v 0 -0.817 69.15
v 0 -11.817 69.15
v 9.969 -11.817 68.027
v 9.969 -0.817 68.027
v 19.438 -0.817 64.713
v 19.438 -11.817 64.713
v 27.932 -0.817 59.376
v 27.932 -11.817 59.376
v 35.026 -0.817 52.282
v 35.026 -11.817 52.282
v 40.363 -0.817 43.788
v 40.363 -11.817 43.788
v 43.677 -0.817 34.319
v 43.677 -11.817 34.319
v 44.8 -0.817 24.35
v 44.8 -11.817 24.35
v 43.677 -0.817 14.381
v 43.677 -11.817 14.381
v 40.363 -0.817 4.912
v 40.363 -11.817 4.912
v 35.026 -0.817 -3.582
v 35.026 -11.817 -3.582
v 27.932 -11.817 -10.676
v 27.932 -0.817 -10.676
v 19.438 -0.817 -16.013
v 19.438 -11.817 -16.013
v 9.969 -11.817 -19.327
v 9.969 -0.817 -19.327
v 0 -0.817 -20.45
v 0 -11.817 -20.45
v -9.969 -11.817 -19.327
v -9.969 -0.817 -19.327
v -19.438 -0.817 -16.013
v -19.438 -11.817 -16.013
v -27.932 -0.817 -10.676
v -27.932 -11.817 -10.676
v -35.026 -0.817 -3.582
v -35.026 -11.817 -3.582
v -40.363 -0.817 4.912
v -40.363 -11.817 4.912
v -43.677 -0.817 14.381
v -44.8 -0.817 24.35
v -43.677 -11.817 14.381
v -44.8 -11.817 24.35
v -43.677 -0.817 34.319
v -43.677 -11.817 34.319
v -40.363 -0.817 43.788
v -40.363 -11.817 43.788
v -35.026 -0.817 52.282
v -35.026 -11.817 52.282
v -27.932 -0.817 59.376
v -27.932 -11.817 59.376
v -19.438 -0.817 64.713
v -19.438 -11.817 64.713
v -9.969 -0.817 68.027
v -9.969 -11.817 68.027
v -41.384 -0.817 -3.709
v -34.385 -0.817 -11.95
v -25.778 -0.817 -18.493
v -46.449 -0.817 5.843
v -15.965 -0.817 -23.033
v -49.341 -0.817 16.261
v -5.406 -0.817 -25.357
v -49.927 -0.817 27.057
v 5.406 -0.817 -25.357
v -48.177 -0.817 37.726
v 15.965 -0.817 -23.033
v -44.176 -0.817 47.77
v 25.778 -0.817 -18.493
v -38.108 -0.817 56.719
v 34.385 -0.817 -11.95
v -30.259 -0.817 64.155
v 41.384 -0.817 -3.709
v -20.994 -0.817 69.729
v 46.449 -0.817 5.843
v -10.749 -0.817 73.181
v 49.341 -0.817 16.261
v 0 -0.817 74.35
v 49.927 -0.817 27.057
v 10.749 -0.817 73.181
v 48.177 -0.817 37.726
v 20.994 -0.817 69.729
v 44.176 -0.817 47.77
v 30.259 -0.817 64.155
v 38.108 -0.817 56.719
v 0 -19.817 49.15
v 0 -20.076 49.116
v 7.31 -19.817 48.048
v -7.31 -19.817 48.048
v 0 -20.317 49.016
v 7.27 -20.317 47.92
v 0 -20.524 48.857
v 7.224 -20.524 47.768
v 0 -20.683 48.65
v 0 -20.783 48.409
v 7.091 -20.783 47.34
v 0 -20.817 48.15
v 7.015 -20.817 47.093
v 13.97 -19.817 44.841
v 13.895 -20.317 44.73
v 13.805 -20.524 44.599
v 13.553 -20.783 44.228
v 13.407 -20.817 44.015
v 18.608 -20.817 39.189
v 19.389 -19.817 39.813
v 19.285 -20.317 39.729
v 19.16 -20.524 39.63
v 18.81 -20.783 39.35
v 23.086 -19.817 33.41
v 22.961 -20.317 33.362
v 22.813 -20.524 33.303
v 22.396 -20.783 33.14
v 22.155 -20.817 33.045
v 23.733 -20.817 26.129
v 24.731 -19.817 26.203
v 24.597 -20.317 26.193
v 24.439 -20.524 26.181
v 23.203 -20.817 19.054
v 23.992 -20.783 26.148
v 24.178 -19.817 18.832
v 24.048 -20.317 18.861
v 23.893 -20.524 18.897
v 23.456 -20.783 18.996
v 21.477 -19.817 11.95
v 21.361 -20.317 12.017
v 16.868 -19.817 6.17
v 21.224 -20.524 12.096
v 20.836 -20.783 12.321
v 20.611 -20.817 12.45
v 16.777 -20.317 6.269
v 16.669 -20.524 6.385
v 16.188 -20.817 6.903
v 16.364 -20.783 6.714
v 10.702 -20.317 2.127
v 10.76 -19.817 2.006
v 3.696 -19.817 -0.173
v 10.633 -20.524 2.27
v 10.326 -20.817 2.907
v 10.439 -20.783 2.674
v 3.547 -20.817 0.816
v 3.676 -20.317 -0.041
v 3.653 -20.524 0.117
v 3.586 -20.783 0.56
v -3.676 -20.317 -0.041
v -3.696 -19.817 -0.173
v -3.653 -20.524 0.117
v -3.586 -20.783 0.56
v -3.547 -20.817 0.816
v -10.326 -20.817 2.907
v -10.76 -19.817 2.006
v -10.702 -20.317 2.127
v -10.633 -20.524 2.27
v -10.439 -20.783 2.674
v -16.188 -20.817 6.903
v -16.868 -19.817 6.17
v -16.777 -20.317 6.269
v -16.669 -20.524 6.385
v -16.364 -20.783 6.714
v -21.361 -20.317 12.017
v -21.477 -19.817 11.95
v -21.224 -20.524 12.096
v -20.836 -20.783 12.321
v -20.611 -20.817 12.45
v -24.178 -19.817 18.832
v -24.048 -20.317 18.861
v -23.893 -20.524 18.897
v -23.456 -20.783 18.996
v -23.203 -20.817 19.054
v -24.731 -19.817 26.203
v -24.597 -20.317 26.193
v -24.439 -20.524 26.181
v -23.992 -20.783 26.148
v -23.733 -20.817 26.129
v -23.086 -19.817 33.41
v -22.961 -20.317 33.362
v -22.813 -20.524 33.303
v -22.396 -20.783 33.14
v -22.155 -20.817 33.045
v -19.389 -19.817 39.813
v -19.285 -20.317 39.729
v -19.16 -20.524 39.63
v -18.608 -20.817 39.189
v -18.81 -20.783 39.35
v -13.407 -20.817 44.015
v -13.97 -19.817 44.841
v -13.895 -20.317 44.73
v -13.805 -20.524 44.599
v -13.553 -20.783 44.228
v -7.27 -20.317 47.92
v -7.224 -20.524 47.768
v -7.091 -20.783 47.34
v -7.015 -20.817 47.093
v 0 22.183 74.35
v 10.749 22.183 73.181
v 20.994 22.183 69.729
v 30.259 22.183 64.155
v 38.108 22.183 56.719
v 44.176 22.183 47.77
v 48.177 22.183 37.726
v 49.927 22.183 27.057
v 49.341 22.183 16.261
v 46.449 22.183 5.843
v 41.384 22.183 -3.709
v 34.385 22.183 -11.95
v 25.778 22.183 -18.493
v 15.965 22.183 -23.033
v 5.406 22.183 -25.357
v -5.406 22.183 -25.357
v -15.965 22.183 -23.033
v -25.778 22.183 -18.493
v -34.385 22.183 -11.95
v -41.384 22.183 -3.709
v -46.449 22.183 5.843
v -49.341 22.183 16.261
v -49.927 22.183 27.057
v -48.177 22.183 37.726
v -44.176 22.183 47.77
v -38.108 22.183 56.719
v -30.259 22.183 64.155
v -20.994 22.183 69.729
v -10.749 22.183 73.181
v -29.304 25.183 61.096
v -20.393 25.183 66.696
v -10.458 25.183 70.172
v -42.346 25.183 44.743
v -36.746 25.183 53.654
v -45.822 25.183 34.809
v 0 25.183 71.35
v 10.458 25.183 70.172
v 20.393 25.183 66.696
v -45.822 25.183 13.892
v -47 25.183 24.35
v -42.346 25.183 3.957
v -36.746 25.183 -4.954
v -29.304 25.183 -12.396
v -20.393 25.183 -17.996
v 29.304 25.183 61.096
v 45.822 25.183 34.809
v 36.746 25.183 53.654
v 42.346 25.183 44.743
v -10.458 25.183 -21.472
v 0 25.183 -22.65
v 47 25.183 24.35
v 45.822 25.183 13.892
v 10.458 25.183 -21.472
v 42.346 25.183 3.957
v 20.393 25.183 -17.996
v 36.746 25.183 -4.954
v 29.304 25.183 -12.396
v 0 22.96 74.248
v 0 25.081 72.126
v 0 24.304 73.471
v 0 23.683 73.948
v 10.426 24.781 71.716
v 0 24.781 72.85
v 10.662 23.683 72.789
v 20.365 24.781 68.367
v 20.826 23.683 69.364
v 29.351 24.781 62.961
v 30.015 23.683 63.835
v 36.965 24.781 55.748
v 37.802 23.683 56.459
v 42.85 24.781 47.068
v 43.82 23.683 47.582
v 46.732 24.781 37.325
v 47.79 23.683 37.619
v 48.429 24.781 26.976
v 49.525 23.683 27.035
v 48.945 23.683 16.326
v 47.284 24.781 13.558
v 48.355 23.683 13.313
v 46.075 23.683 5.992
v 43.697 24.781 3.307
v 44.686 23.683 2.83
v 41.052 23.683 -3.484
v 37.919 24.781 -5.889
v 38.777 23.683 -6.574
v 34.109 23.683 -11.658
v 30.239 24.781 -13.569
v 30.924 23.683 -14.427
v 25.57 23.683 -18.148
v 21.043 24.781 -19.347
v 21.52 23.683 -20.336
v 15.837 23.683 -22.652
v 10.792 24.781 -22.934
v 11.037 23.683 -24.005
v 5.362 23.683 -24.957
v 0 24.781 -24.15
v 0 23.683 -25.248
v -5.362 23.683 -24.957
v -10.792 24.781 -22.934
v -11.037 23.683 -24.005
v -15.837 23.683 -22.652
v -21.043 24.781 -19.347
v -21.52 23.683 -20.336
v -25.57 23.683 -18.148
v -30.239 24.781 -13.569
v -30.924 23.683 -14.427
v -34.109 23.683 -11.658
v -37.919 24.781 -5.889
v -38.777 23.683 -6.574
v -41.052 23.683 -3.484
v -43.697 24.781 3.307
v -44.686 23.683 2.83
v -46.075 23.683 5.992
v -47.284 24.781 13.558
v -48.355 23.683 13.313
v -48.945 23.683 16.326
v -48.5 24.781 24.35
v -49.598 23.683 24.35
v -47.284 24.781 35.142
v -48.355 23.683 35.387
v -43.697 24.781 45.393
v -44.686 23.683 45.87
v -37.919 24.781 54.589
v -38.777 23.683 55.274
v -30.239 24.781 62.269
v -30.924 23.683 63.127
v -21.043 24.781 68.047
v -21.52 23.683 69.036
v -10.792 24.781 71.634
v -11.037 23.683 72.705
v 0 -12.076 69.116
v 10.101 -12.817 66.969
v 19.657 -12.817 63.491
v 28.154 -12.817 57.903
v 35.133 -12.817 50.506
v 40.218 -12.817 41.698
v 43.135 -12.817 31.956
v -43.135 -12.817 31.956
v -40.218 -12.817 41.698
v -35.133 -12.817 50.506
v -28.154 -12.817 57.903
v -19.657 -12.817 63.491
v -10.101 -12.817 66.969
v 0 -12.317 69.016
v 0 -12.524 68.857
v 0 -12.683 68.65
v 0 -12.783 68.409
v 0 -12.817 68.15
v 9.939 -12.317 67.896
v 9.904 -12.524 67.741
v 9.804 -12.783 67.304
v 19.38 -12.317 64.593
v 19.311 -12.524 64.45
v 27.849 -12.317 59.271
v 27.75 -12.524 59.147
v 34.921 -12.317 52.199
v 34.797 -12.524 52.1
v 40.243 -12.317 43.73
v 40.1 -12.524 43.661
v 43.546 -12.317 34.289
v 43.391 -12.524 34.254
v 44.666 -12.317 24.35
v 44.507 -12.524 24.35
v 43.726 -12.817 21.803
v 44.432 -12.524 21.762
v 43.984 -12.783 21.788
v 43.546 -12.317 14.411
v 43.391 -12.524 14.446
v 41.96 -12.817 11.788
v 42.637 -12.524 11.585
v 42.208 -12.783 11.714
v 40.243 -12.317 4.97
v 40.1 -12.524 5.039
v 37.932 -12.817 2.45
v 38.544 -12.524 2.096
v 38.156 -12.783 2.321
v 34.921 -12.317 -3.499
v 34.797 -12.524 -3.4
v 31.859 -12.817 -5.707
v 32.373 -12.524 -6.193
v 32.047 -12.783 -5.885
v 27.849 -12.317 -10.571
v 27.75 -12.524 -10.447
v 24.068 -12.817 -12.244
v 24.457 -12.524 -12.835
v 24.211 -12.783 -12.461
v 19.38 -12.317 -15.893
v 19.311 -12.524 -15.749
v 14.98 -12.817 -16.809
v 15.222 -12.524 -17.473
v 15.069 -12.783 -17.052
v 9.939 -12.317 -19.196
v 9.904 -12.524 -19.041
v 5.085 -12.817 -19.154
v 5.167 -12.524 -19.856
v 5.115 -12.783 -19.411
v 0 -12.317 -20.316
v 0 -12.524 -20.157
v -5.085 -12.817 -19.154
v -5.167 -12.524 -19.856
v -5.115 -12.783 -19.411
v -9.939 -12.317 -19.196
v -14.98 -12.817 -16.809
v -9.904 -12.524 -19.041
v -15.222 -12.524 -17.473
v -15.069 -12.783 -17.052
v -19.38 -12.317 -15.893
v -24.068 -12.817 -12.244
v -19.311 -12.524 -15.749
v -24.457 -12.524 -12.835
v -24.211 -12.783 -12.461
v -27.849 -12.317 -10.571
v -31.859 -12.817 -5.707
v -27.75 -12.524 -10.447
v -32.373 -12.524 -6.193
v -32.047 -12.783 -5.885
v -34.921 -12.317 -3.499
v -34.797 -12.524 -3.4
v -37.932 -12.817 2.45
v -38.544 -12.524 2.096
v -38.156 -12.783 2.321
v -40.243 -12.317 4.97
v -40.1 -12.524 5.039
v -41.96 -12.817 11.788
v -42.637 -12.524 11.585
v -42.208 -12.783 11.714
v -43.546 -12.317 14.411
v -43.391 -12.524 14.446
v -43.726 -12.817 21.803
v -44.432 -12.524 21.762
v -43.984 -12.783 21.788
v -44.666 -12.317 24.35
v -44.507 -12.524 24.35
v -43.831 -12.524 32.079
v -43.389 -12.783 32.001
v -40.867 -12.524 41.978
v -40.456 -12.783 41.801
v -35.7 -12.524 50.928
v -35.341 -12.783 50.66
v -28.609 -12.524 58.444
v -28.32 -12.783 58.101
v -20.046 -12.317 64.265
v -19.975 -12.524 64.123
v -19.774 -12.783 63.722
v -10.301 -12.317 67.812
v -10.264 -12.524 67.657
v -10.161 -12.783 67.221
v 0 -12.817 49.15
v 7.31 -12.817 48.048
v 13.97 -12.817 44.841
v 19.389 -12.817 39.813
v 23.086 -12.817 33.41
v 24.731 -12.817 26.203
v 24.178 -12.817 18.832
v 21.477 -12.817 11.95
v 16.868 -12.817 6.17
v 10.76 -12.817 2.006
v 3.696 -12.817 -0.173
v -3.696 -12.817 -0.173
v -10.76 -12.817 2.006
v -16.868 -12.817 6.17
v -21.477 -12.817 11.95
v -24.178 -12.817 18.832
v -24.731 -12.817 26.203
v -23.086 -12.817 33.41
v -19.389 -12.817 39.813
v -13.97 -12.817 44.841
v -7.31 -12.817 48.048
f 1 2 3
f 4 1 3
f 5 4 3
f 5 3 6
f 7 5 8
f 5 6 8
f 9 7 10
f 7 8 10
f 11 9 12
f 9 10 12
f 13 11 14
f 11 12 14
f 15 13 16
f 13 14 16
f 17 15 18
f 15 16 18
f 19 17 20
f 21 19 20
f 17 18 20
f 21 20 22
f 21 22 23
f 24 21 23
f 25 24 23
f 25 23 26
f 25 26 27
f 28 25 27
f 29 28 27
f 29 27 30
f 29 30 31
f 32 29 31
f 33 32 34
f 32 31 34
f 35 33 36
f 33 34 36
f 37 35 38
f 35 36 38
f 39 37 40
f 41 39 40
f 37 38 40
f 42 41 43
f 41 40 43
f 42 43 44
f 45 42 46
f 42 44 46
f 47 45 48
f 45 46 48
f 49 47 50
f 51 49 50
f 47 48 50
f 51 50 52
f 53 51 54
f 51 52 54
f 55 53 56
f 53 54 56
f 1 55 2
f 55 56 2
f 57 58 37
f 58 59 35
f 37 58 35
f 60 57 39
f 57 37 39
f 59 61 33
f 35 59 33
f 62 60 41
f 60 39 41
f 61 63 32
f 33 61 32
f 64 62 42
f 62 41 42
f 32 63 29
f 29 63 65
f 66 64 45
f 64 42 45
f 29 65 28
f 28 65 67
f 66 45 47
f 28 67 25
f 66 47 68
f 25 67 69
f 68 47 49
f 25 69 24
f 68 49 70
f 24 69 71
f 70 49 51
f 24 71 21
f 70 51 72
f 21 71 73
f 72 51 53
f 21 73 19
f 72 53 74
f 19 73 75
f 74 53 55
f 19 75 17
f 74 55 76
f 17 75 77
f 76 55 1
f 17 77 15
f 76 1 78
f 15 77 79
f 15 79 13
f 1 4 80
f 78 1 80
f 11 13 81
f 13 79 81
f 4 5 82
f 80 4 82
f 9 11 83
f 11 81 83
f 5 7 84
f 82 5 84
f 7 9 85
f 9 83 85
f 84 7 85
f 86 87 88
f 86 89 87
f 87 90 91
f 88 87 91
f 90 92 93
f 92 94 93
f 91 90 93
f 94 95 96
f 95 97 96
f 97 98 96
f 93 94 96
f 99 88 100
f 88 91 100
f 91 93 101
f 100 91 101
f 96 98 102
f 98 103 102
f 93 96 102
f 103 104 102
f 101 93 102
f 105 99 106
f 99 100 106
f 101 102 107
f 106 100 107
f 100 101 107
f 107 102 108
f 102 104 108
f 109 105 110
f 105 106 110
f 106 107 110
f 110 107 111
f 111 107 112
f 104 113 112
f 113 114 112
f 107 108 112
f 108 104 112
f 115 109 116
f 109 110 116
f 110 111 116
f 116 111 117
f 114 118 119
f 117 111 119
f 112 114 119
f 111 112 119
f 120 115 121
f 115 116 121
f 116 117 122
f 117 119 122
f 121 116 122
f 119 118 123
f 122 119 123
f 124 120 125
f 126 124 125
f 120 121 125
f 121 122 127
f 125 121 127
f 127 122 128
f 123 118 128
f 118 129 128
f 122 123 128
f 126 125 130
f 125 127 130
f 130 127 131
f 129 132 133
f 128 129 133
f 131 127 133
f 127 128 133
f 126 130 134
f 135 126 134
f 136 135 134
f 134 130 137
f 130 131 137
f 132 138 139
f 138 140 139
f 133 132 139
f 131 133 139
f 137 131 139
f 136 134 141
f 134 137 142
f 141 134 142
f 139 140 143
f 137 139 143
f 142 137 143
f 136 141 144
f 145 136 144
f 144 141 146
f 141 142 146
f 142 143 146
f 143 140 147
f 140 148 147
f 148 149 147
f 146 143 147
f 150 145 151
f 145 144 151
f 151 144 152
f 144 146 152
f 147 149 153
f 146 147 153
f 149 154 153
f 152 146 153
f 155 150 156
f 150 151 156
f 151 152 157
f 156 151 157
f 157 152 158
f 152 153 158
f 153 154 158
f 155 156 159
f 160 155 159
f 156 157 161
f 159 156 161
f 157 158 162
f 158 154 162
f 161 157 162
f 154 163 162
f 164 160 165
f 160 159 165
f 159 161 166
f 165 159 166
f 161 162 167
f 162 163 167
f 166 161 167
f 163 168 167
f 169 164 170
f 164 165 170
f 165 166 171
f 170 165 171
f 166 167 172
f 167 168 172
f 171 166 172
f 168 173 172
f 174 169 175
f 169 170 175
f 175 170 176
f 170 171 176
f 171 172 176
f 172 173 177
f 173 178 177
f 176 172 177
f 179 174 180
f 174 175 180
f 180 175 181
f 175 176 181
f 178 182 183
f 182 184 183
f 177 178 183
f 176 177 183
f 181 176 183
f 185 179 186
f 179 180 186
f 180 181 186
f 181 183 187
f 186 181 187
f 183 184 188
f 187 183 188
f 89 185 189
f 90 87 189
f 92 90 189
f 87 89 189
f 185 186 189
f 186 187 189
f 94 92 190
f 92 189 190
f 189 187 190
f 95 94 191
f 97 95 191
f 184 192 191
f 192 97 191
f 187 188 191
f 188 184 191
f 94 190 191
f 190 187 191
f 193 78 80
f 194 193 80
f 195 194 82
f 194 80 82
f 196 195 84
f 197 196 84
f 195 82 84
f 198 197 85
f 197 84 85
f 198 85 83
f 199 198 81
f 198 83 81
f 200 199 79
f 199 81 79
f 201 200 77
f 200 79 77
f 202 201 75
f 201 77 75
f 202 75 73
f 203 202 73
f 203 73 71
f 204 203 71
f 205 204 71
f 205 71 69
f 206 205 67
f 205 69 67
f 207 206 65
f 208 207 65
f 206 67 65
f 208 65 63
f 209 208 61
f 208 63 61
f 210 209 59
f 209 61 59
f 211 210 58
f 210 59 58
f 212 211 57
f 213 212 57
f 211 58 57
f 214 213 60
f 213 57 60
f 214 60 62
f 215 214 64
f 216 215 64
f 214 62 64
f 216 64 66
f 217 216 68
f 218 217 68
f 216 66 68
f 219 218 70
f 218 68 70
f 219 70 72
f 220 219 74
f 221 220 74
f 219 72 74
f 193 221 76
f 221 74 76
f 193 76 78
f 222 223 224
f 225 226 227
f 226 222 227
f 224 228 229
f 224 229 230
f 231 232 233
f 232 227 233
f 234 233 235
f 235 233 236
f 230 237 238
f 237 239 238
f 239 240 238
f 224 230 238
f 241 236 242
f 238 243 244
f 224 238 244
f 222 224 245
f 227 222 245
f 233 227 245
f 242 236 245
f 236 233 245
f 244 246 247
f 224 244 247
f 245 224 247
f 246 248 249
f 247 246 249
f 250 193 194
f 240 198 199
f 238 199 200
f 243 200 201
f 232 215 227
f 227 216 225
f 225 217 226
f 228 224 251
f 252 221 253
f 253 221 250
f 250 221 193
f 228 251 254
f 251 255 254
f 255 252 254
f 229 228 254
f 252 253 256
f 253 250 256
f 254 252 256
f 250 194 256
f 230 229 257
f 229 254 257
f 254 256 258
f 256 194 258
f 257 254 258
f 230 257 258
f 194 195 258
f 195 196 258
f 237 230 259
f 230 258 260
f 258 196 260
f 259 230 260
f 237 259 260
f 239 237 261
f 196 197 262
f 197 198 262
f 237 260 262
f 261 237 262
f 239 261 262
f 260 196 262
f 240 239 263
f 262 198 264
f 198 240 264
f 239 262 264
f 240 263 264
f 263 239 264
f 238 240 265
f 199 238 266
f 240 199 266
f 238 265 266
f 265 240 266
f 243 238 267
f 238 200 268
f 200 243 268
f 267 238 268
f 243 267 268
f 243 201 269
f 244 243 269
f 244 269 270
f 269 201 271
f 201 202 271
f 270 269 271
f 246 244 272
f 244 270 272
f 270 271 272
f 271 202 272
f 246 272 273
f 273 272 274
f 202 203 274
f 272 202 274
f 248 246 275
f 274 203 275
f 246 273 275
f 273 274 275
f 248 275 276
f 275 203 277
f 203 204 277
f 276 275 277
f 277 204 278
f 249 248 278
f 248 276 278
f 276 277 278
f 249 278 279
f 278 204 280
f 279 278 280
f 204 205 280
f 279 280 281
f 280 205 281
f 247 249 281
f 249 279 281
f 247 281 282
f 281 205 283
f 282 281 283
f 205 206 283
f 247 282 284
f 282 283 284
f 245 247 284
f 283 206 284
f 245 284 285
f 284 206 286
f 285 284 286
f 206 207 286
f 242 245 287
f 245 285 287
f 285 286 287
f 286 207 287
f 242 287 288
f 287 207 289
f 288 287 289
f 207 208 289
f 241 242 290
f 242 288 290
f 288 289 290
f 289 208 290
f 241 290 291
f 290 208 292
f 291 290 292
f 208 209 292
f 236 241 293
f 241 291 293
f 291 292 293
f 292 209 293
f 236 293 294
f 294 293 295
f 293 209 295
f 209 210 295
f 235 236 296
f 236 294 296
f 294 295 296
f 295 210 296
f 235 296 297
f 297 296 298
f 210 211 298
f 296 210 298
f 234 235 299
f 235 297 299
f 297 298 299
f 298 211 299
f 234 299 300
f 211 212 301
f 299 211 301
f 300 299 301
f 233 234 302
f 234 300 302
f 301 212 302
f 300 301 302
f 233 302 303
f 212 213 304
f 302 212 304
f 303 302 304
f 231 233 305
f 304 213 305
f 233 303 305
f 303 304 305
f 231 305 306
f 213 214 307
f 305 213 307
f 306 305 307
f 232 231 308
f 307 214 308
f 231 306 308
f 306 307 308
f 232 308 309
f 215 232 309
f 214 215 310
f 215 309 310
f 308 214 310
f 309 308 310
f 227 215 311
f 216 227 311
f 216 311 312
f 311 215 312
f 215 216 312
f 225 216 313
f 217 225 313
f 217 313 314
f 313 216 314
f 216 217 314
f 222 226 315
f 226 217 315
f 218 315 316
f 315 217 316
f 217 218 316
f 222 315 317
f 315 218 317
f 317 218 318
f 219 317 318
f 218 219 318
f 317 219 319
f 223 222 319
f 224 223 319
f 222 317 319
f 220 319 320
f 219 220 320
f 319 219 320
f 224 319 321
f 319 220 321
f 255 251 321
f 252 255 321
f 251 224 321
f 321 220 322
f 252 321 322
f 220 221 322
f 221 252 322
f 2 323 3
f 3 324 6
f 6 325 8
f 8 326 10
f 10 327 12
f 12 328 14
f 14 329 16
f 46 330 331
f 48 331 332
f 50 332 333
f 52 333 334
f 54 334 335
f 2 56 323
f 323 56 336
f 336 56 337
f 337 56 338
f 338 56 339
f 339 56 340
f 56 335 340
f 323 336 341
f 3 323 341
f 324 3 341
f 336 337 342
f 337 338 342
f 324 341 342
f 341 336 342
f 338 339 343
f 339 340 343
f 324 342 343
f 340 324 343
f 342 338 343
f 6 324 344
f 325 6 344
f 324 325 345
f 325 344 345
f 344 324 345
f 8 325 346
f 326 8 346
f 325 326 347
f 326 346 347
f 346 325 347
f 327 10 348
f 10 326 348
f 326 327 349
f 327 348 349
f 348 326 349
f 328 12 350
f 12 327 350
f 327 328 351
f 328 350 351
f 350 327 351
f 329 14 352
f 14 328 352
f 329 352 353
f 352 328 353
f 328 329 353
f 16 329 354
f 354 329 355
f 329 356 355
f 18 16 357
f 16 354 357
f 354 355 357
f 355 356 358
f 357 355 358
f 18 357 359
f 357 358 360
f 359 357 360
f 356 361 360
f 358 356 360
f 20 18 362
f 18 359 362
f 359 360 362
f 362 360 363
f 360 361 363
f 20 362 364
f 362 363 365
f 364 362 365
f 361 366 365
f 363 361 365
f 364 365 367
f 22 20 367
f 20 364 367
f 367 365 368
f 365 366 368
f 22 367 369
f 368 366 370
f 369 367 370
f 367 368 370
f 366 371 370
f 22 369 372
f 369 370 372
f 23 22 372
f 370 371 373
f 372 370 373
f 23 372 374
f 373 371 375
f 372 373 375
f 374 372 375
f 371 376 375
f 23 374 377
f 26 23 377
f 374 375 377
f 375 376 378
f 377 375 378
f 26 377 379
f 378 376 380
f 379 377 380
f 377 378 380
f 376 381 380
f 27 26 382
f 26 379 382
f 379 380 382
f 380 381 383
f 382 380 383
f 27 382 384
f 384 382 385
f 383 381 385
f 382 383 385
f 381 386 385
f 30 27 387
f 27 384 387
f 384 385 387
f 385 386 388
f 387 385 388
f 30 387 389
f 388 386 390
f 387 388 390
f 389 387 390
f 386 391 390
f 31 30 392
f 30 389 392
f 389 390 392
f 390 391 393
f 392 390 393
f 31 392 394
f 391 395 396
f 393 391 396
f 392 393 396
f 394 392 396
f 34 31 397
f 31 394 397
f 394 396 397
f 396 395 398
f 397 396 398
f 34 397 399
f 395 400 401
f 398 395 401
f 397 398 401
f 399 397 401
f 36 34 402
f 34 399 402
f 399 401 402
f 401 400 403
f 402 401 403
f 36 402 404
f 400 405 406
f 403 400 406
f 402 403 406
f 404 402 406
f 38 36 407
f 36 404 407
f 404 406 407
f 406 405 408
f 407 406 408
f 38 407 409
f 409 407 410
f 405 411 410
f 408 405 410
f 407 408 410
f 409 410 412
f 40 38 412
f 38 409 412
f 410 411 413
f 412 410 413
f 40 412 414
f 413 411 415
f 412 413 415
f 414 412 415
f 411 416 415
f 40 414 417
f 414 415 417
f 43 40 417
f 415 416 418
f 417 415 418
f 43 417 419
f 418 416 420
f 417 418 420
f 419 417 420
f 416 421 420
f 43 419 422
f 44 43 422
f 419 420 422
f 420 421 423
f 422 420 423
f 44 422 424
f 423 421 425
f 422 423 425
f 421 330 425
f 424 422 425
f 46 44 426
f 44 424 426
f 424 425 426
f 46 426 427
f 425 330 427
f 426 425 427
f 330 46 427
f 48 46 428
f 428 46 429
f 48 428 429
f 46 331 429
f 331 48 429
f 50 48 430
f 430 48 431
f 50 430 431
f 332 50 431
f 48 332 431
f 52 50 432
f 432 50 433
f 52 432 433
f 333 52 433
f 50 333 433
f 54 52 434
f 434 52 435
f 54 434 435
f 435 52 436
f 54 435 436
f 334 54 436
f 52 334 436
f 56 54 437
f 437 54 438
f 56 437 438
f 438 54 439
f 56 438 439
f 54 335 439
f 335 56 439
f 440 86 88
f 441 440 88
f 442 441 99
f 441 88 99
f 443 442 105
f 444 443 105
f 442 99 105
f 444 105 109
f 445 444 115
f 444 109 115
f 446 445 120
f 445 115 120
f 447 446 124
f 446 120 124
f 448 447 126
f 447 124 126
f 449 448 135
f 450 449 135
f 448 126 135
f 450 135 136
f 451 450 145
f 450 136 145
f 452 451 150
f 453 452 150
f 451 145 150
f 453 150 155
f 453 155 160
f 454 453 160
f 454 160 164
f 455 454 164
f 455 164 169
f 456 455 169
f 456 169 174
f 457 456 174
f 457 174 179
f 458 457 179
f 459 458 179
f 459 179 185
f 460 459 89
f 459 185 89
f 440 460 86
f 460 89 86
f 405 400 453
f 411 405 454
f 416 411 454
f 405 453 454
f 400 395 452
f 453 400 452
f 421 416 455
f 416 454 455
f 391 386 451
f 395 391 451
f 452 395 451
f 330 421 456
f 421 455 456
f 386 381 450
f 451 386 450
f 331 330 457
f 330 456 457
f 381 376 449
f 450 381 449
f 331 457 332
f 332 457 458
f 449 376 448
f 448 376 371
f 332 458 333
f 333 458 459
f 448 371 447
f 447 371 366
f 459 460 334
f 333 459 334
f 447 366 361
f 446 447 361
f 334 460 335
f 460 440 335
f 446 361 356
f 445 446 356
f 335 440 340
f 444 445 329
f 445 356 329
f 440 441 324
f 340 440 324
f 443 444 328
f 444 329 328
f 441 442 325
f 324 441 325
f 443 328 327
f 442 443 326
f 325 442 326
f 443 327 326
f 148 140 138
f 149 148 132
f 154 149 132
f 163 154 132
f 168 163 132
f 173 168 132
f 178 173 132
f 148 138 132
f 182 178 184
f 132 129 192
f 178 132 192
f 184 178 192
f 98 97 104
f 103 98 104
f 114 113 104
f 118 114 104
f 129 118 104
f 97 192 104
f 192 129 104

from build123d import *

# Parameters (mm, degrees)
F2_R = 3
F3_R = 1
F4_R = 1


with BuildPart() as f1:
    # F0 (on Right) → F1 (revolve)
    with BuildSketch(Plane.YZ):
        Polygon((-20.8168569952, 49.1500228971), (-20.8168569952, 24.3500228971), (25.1831430048, 24.3500228971), (25.1831430048, 74.3500228971), (-0.8168569952, 74.3500228971), (-0.8168569952, 69.1500228971), (-12.8168569952, 69.1500228971), (-12.8168569952, 49.1500228971), align=None)
    revolve(axis=Axis((0, 2.1831430048, 24.3500228971), (0, 1, 0)))

    # F2
    f2_edges = [f1.edges().sort_by_distance(p)[0] for p in [
        (0, 25.183143, -25.649977),
    ]]
    fillet(f2_edges, radius=F2_R)

    # F3
    f3_edges = [f1.edges().sort_by_distance(p)[0] for p in [
        (0, -12.816857, -20.449977),
    ]]
    fillet(f3_edges, radius=F3_R)

    # F4
    f4_edges = [f1.edges().sort_by_distance(p)[0] for p in [
        (0, -20.816857, -0.449977),
    ]]
    fillet(f4_edges, radius=F4_R)


solid = f1.part
